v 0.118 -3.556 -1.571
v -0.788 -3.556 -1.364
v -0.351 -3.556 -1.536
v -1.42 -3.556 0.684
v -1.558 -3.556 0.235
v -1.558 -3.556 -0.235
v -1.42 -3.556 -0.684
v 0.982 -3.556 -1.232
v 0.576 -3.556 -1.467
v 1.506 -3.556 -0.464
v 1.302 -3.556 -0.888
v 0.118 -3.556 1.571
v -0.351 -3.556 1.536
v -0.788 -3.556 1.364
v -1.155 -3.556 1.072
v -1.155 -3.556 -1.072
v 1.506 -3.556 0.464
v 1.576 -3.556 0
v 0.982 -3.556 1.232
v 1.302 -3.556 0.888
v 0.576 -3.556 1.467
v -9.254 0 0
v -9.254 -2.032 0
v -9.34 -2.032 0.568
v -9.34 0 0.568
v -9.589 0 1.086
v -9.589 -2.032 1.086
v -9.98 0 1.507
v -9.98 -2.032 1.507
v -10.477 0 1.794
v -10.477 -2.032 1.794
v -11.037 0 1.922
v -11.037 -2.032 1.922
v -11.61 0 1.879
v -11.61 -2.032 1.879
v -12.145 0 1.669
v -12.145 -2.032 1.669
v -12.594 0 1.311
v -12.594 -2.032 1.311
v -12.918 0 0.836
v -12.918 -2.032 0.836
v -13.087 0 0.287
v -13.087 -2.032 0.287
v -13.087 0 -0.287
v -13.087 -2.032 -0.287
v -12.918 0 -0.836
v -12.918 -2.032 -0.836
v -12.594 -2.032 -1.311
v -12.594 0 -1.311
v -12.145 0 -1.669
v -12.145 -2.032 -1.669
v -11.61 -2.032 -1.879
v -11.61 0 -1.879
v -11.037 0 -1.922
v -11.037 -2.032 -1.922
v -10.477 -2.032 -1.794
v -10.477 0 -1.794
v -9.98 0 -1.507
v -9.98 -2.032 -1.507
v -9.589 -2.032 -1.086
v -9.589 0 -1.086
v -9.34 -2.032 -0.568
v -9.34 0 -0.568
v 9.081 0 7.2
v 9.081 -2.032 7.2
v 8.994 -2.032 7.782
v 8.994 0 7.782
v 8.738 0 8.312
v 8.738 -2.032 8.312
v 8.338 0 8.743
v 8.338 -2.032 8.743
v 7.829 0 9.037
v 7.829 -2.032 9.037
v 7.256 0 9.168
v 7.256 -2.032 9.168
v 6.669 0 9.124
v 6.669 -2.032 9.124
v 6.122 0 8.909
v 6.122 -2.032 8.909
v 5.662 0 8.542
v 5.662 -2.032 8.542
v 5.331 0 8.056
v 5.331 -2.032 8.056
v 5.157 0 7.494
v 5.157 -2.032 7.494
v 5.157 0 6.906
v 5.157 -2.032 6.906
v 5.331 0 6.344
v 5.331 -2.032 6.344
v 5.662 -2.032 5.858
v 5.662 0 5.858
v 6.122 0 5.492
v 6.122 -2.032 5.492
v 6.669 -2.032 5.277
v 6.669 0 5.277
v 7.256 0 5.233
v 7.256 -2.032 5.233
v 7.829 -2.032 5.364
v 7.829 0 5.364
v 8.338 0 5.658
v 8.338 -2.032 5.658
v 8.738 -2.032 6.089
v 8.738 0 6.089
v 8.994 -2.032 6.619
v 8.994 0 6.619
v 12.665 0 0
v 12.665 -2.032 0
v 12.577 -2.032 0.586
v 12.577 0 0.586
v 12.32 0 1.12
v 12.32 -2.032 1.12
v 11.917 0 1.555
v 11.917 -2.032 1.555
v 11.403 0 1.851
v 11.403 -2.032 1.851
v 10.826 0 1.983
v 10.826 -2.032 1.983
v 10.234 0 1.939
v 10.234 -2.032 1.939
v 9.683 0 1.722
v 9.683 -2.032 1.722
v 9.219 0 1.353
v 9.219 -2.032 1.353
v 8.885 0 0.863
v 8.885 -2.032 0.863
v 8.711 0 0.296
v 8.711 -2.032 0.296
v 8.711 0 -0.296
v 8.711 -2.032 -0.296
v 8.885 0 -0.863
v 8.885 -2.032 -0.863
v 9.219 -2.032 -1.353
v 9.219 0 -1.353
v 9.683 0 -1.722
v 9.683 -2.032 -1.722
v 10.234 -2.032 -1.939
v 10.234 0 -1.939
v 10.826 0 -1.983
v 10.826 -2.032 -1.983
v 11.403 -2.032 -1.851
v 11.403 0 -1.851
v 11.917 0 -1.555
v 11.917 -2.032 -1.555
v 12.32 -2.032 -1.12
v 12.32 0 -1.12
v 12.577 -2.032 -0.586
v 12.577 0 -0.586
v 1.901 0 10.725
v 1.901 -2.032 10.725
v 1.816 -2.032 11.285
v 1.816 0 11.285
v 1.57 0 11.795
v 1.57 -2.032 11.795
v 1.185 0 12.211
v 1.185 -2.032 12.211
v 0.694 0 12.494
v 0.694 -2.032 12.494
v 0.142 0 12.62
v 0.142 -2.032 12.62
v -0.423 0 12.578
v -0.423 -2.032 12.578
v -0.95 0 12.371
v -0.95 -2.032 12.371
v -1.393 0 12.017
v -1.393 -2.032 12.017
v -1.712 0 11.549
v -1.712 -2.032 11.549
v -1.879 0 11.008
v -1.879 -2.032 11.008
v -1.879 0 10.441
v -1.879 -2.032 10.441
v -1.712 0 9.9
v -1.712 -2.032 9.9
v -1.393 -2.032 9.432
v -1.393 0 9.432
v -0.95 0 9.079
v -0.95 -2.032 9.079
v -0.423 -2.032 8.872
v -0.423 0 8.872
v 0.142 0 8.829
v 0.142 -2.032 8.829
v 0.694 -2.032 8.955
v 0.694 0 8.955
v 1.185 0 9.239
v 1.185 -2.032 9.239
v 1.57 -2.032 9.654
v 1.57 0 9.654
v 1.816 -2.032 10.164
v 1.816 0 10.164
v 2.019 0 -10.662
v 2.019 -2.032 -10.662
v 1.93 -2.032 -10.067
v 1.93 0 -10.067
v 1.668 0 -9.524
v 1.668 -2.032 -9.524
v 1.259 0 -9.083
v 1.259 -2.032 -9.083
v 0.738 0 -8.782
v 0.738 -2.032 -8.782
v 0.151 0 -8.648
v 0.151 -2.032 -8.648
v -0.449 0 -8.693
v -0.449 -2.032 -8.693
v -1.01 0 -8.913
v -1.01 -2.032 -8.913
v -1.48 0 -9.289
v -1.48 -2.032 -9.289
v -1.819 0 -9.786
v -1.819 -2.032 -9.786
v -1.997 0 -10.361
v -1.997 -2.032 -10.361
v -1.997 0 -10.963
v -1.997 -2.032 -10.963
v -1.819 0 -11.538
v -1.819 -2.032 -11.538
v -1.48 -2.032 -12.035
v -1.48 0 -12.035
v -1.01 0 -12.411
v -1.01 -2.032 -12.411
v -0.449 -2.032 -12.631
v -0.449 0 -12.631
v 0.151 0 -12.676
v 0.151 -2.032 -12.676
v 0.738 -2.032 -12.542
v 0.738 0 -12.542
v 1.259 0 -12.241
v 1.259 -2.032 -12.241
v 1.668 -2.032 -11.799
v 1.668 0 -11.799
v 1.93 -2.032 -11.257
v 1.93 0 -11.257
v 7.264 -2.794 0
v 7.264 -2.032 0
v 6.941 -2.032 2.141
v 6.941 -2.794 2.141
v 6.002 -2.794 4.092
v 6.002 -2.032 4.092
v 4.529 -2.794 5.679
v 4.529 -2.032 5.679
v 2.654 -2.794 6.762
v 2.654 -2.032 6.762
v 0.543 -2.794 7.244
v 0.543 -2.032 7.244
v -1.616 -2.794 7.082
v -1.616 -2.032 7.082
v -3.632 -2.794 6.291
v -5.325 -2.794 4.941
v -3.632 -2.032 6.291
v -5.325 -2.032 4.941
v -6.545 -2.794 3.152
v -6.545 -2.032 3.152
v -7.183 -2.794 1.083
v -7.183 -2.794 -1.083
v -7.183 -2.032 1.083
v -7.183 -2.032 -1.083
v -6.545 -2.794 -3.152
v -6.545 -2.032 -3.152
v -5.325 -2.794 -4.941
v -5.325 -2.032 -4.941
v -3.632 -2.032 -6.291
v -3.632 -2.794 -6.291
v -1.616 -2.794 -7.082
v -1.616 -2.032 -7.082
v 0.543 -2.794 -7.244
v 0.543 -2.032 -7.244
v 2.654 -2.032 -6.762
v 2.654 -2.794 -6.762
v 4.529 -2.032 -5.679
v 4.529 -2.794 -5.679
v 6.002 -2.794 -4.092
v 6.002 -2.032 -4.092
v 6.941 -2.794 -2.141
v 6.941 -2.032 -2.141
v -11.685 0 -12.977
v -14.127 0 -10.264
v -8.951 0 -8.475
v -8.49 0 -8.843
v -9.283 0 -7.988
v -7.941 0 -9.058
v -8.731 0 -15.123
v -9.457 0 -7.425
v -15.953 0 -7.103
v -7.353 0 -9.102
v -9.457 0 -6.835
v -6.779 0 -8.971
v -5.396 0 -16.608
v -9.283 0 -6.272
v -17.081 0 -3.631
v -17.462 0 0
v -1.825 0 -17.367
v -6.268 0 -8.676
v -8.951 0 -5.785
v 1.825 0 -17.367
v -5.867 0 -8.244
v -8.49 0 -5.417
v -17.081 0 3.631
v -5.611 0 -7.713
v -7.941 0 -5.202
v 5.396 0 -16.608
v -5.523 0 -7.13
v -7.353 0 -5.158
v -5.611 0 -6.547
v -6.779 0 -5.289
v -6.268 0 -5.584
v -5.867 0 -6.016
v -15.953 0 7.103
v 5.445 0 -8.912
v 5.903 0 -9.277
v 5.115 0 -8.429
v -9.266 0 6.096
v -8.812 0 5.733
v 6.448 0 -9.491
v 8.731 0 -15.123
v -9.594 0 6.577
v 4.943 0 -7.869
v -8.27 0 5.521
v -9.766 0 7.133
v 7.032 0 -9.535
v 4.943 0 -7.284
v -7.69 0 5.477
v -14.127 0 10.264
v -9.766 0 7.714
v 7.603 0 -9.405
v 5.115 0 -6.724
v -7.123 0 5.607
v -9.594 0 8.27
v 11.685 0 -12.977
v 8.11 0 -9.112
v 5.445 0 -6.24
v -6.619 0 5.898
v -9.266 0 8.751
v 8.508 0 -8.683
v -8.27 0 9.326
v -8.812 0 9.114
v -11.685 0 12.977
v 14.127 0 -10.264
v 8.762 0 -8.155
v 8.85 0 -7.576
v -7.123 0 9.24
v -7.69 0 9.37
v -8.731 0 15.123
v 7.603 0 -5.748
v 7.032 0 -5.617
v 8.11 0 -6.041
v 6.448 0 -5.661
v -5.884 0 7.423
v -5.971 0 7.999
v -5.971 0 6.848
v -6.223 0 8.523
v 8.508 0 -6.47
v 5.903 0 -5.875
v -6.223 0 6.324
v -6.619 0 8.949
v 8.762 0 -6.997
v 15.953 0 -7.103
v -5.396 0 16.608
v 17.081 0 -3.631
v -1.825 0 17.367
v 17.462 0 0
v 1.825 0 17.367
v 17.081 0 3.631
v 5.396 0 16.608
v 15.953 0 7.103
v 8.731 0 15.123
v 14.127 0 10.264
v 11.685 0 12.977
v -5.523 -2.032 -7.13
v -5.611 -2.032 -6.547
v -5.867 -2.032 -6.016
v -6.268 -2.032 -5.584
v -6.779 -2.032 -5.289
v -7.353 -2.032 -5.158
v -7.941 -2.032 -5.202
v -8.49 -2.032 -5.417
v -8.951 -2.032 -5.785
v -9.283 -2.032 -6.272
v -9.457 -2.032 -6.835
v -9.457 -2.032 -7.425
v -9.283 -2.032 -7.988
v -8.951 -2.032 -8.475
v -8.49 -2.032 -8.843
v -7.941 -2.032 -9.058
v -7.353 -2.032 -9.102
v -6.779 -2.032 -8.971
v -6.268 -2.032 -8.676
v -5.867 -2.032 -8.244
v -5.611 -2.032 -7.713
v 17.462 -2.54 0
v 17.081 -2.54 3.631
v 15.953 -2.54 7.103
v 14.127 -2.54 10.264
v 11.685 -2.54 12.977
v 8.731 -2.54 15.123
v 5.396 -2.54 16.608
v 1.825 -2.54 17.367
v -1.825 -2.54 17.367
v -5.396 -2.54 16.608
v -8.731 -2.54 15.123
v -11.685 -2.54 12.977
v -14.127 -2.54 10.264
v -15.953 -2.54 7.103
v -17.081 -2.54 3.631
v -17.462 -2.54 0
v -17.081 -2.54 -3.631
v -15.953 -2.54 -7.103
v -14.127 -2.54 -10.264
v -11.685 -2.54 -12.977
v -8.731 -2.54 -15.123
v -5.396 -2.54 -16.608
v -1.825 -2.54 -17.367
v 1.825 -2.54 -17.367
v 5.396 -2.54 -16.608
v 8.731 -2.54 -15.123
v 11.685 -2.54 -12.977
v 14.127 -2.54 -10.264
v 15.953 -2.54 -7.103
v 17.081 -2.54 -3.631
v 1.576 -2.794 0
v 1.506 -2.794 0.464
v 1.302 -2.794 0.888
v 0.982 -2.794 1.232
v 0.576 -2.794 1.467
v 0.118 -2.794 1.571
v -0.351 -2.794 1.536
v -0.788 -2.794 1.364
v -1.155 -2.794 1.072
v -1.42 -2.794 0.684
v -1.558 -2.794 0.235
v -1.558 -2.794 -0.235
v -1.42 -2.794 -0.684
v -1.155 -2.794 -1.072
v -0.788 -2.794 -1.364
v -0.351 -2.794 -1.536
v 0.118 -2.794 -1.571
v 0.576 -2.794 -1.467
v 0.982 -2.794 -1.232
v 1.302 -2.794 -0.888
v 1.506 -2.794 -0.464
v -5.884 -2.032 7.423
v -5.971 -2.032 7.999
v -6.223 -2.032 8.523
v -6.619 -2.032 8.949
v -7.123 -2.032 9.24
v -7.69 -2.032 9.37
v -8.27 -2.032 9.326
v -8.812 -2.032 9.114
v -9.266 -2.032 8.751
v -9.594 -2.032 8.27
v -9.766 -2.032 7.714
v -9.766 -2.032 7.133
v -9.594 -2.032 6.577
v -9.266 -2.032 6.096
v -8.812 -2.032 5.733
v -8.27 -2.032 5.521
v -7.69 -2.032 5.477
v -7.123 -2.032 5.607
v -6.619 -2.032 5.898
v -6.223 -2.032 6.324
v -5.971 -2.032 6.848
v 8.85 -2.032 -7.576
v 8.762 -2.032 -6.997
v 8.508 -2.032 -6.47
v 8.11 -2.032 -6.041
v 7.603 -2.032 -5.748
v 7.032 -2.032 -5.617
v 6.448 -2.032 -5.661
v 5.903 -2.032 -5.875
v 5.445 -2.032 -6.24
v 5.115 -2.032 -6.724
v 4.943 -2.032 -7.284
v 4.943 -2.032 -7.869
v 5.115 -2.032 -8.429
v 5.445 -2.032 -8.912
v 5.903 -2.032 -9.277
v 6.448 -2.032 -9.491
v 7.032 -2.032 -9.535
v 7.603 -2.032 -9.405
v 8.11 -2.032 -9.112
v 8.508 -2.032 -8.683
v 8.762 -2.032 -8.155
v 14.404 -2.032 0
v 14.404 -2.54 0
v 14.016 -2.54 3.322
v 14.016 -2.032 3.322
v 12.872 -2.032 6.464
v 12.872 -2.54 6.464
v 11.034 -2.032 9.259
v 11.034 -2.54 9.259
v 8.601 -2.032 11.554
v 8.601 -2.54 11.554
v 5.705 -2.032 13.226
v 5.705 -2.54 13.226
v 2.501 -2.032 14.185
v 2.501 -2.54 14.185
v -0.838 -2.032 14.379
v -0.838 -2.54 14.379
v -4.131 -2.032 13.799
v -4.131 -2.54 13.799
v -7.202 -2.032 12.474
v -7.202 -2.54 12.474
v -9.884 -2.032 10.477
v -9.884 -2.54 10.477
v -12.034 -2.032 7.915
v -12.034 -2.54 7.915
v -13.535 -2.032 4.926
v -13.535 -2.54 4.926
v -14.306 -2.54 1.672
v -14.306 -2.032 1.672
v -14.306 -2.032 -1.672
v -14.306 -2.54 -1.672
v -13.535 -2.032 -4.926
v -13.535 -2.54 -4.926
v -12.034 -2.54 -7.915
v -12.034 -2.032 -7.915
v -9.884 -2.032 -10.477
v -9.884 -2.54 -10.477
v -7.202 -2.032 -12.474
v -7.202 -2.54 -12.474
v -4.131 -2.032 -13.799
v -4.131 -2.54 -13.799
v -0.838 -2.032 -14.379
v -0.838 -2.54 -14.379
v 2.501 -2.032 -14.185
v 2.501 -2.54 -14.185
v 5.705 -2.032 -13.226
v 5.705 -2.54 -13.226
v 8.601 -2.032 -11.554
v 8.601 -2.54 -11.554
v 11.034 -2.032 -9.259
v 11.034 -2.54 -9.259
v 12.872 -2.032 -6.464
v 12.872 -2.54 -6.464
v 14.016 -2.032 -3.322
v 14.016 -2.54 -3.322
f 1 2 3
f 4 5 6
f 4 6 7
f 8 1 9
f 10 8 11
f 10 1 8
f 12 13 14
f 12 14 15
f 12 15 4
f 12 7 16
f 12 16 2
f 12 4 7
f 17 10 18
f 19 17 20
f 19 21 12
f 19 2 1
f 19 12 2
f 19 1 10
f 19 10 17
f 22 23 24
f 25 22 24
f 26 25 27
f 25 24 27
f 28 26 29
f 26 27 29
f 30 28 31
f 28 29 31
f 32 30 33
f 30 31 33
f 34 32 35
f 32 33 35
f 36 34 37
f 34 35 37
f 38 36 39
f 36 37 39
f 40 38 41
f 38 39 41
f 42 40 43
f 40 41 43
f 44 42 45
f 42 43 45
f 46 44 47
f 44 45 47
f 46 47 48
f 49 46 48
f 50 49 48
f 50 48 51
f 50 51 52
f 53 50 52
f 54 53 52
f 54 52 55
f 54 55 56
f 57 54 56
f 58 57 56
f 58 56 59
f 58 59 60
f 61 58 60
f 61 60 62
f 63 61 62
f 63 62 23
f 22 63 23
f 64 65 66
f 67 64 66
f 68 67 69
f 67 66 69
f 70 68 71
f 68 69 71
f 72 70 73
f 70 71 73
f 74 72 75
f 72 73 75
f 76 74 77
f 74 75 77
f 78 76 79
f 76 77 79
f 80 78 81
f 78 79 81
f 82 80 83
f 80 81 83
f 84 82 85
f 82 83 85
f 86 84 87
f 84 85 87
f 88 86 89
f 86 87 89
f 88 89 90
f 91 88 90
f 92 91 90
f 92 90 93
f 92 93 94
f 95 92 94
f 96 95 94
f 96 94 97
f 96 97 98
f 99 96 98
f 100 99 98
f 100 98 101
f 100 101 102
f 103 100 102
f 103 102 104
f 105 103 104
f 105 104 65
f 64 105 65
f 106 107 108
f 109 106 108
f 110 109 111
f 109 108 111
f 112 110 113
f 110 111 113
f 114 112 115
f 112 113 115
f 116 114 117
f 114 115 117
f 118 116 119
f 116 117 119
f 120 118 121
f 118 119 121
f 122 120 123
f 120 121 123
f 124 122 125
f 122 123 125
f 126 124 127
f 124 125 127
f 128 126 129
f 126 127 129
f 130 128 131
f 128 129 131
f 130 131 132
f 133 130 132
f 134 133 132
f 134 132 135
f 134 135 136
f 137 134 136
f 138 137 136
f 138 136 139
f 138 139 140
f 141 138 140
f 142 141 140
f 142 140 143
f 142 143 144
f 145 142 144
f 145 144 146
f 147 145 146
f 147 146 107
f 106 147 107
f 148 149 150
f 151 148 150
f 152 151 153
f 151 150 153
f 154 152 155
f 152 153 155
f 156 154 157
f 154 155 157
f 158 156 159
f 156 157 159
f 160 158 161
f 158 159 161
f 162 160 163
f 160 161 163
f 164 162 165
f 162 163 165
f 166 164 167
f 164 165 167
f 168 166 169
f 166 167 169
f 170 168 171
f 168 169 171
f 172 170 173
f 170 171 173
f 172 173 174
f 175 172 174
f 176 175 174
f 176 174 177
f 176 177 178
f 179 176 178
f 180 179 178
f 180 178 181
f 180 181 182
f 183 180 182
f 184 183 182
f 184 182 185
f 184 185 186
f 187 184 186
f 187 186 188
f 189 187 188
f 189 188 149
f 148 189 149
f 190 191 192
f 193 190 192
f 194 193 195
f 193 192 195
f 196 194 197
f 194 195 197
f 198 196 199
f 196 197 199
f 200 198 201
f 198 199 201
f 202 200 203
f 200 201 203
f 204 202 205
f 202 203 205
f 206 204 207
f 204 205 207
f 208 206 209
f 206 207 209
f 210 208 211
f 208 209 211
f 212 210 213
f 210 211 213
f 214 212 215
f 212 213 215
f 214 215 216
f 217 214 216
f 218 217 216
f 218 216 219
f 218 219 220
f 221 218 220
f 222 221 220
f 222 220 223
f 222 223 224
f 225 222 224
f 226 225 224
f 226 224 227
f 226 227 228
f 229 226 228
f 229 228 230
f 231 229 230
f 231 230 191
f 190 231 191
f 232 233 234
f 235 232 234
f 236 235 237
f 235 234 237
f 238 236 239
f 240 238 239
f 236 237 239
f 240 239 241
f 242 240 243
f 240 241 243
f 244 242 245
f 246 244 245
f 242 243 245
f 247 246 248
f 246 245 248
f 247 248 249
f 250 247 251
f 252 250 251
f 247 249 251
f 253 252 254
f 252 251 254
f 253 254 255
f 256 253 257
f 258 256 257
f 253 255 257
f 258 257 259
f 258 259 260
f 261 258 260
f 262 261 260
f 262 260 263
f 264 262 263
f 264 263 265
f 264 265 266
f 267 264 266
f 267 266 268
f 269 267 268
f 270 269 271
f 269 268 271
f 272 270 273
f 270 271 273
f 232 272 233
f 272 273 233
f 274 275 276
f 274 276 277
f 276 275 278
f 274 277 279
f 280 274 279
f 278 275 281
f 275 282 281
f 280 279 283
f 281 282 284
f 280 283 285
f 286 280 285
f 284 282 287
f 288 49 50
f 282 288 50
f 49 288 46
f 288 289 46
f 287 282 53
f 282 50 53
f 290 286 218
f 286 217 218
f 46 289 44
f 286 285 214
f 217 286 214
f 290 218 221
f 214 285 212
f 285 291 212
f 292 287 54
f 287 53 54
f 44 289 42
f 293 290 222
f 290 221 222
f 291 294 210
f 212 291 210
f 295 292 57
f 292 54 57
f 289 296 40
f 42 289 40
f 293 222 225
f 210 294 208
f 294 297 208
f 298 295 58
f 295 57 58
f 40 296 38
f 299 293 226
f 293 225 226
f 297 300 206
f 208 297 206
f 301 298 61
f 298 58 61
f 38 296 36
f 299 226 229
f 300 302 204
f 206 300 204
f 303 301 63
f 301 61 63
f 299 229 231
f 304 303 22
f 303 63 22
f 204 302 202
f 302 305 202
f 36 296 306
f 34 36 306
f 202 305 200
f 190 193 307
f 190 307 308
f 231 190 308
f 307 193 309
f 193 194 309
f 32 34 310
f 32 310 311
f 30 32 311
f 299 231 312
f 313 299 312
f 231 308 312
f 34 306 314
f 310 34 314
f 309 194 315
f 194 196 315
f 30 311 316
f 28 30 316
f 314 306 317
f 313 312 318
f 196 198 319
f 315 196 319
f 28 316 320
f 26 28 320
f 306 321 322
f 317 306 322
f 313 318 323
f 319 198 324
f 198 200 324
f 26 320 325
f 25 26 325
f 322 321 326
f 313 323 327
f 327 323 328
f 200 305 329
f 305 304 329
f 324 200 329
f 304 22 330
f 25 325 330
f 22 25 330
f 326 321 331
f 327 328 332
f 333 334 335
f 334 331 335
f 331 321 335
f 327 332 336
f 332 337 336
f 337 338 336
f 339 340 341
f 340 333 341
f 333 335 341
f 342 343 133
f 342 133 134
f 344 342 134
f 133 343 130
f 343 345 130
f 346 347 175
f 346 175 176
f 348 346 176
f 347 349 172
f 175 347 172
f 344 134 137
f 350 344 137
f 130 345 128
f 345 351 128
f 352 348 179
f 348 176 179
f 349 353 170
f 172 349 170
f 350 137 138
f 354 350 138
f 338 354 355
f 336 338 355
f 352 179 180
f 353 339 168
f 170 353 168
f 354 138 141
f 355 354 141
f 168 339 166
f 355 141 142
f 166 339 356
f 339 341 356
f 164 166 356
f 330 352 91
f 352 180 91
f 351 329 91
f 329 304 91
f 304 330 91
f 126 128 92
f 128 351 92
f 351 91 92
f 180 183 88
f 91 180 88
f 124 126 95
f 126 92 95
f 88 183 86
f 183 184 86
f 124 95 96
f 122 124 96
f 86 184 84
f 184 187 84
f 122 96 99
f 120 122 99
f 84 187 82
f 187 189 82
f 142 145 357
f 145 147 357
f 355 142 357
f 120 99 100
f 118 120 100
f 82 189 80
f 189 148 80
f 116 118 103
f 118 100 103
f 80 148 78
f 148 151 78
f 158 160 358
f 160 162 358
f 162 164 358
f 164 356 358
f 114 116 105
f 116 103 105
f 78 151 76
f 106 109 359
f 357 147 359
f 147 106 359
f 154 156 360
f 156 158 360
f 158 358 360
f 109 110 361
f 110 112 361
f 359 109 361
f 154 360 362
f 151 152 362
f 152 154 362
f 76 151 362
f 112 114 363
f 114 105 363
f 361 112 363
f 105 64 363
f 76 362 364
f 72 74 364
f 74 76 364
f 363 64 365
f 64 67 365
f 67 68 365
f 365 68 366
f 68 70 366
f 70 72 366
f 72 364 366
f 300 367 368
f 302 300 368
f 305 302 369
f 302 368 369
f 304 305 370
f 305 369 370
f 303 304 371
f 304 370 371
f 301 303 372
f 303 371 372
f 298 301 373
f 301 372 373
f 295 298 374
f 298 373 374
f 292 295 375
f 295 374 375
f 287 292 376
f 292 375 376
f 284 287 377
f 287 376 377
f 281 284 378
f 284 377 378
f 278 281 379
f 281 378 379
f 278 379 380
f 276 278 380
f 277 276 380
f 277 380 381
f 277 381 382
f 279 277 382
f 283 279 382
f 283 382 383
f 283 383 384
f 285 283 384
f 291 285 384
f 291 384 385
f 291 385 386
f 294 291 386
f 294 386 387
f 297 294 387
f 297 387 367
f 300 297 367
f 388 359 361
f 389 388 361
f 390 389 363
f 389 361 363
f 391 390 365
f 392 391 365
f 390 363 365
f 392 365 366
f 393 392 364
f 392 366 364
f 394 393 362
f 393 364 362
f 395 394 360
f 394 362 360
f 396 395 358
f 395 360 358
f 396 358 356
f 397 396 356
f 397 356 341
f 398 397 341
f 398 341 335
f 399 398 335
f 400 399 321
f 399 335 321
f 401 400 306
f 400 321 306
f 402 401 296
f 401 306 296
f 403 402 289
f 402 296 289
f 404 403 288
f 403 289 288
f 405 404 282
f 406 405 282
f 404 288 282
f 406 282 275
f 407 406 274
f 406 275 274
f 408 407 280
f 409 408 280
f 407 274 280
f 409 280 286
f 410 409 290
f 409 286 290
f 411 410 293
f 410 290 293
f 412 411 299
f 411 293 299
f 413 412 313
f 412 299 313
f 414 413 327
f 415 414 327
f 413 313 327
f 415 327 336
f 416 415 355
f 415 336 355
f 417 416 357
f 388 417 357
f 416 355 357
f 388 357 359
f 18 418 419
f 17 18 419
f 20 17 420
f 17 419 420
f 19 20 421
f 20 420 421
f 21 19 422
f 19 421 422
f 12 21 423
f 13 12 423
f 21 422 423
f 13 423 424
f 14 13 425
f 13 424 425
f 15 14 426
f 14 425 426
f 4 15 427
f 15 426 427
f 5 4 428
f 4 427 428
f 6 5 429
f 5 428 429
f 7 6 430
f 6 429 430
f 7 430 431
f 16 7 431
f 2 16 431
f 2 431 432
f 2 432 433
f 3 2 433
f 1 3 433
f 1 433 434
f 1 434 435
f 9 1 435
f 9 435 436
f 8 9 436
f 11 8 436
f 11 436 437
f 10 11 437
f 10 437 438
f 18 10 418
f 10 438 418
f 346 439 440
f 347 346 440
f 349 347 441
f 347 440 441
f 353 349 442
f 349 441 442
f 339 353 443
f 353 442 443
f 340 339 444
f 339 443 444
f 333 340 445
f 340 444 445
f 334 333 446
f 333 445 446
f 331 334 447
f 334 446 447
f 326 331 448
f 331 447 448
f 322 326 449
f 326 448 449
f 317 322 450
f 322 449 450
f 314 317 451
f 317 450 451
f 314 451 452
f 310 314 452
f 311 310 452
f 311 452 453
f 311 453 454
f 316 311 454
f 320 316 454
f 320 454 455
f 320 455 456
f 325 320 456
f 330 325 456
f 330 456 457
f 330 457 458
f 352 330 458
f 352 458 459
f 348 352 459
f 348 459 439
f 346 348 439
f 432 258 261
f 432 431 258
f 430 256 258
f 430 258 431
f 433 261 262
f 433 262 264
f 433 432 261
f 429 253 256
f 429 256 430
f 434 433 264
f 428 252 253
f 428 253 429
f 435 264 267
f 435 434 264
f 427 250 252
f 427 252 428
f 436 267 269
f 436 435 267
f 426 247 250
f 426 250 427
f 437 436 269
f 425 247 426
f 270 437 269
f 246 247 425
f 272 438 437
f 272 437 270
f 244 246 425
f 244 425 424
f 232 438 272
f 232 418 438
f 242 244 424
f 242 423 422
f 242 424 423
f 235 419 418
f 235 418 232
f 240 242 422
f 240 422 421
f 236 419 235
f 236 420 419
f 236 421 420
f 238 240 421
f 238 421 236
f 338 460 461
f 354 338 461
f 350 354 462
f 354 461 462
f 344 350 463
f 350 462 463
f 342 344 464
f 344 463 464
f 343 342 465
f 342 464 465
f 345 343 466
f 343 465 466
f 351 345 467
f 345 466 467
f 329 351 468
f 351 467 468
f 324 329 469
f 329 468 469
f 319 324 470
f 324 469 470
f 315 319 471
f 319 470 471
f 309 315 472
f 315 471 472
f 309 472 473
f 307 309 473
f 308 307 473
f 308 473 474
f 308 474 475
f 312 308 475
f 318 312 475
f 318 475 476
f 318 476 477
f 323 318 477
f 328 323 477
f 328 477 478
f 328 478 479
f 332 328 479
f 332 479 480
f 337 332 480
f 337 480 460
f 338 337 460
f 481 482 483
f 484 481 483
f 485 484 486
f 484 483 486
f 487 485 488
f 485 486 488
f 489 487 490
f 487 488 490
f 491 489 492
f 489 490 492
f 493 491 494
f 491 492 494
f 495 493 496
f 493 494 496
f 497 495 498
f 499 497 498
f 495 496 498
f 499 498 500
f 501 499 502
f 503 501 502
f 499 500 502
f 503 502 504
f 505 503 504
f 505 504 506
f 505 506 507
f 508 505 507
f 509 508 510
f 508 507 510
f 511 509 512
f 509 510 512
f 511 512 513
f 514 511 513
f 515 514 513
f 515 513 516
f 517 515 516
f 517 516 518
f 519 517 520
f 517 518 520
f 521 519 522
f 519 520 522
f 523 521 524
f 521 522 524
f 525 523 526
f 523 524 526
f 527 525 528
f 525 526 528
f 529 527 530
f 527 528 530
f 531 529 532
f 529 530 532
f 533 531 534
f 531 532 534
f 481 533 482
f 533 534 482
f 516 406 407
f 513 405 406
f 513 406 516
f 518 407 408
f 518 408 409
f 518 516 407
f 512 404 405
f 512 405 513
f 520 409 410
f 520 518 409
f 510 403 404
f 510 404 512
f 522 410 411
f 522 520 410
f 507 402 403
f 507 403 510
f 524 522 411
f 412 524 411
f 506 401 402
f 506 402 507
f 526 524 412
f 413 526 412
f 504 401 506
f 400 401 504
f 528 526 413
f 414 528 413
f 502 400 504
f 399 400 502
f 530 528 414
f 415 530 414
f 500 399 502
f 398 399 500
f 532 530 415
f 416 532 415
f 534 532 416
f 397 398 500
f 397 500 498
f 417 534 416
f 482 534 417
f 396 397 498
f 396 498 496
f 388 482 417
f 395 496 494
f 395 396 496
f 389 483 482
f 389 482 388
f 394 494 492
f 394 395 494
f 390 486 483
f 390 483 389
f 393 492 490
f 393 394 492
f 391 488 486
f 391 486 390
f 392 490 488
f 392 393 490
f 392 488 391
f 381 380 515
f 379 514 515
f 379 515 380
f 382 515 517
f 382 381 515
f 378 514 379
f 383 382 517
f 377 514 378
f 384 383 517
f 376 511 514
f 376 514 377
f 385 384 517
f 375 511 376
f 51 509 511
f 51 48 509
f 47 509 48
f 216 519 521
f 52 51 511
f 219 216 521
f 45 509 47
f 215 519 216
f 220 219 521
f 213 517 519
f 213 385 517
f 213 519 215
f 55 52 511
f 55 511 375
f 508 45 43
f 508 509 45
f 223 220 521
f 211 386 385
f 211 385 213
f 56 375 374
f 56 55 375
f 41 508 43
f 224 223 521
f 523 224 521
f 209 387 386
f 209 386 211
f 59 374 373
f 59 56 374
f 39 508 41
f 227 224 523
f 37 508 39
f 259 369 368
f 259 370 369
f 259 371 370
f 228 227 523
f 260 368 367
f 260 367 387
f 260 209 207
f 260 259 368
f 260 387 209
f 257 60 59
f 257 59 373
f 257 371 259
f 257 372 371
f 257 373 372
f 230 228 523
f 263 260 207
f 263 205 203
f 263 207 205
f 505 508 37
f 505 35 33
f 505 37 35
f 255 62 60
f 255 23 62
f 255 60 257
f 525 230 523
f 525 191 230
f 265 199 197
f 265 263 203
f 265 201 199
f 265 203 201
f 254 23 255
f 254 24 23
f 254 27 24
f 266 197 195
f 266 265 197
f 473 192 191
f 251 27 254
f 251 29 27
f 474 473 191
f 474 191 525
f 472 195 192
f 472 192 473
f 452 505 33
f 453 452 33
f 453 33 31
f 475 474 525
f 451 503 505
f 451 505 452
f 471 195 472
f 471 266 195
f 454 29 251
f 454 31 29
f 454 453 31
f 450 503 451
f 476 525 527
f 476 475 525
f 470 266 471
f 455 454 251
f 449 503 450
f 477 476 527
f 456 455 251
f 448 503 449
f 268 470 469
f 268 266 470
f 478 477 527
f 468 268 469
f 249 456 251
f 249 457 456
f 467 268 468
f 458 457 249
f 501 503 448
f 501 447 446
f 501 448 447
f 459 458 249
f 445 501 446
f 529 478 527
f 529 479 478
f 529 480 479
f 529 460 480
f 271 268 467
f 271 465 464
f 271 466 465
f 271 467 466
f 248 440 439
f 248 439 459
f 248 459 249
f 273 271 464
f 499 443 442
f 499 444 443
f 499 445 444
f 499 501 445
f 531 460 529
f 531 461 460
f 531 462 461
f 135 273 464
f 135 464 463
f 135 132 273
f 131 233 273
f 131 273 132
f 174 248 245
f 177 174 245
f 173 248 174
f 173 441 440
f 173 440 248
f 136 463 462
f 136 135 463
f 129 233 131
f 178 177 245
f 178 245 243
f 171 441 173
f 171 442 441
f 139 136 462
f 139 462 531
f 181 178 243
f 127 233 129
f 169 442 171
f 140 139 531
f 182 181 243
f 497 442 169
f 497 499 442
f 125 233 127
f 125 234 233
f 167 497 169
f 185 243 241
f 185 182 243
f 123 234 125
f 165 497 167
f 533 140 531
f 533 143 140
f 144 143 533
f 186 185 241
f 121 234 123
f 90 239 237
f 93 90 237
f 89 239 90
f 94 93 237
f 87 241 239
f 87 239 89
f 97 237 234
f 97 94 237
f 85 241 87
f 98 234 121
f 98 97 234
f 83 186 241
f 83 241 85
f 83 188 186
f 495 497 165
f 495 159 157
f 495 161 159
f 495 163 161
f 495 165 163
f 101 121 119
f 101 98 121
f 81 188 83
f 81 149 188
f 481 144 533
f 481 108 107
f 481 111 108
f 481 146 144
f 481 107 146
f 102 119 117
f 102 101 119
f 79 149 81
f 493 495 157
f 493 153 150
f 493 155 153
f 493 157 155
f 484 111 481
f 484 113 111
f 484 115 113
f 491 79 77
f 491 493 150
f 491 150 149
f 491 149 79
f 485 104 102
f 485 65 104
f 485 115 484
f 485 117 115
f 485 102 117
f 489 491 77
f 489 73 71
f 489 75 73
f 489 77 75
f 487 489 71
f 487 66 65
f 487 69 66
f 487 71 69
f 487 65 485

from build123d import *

# Parameters (mm, degrees)
F0_R      = 17.4625
F1_DEPTH  = 2.54
F2_R      = 14.4038068866
F3_DEPTH  = 0.508
F4_R      = 7.2639989676
F5_DEPTH  = 0.762
F6_R      = 1.5755390971
F7_DEPTH  = 0.762
F8_R      = 1.9006154527
F9_DEPTH  = 25.4
F10_R     = 2.0193
F11_DEPTH = 25.4
F12_R     = 1.927458399
F13_DEPTH = 25.4
F14_R     = 1.9885487684
F15_DEPTH = 25.4
F16_R     = 1.9516354427
F17_DEPTH = 25.4
F18_R     = 1.9777477245
F19_DEPTH = 25.4
F20_R     = 1.9643397756
F21_DEPTH = 25.4
F22_R     = 1.9730256653
F23_DEPTH = 25.4


# Not quite as in the source:
# - the program builds the solid bodies; features that only make, move or delete a surface that nothing else refers to are left out


with BuildPart() as f1:
    # F0 (on Front) → F1 (new body)
    with BuildSketch(Plane.XZ):
        Circle(F0_R)
    extrude(amount=F1_DEPTH)

    # F2 (on face) → F3 (cut)
    with BuildSketch(Plane.XZ.offset(2.54)):
        Circle(F2_R)
    extrude(amount=-F3_DEPTH, mode=Mode.SUBTRACT)

    # F4 (on face) → F5 (join)
    with BuildSketch(Plane.XZ.offset(2.032)):
        Circle(F4_R)
    extrude(amount=F5_DEPTH)

    # F6 (on face) → F7 (join)
    with BuildSketch(Plane.XZ.offset(2.794)):
        Circle(F6_R)
    extrude(amount=F7_DEPTH)

    # F8 (on face) → F9 (cut)
    with BuildSketch(Plane.XZ.offset(2.032)):
        with Locations((0, 10.7245491818)):
            Circle(F8_R)
    extrude(amount=-F9_DEPTH, mode=Mode.SUBTRACT)

    # F10 (on face) → F11 (cut)
    with BuildSketch(Plane.XZ.offset(2.032)):
        with Locations((0, -10.661974936)):
            Circle(F10_R)
    extrude(amount=-F11_DEPTH, mode=Mode.SUBTRACT)

    # F12 (on face) → F13 (cut)
    with BuildSketch(Plane.XZ.offset(2.032)):
        with Locations((-11.1813889816, 0)):
            Circle(F12_R)
    extrude(amount=-F13_DEPTH, mode=Mode.SUBTRACT)

    # F14 (on face) → F15 (cut)
    with BuildSketch(Plane.XZ.offset(2.032)):
        with Locations((10.6769250706, 0)):
            Circle(F14_R)
    extrude(amount=-F15_DEPTH, mode=Mode.SUBTRACT)

    # F16 (on face) → F17 (cut)
    with BuildSketch(Plane.XZ.offset(2.032)):
        with Locations((-7.8357290477, 7.4233920313)):
            Circle(F16_R)
    extrude(amount=-F17_DEPTH, mode=Mode.SUBTRACT)

    # F18 (on face) → F19 (cut)
    with BuildSketch(Plane.XZ.offset(2.032)):
        with Locations((-7.5011625886, -7.130230777)):
            Circle(F18_R)
    extrude(amount=-F19_DEPTH, mode=Mode.SUBTRACT)

    # F20 (on face) → F21 (cut)
    with BuildSketch(Plane.XZ.offset(2.032)):
        with Locations((6.8851769902, -7.5763189234)):
            Circle(F20_R)
    extrude(amount=-F21_DEPTH, mode=Mode.SUBTRACT)

    # F22 (on face) → F23 (cut)
    with BuildSketch(Plane.XZ.offset(2.032)):
        with Locations((7.1082208306, 7.200348191)):
            Circle(F22_R)
    extrude(amount=-F23_DEPTH, mode=Mode.SUBTRACT)


solid = f1.part
